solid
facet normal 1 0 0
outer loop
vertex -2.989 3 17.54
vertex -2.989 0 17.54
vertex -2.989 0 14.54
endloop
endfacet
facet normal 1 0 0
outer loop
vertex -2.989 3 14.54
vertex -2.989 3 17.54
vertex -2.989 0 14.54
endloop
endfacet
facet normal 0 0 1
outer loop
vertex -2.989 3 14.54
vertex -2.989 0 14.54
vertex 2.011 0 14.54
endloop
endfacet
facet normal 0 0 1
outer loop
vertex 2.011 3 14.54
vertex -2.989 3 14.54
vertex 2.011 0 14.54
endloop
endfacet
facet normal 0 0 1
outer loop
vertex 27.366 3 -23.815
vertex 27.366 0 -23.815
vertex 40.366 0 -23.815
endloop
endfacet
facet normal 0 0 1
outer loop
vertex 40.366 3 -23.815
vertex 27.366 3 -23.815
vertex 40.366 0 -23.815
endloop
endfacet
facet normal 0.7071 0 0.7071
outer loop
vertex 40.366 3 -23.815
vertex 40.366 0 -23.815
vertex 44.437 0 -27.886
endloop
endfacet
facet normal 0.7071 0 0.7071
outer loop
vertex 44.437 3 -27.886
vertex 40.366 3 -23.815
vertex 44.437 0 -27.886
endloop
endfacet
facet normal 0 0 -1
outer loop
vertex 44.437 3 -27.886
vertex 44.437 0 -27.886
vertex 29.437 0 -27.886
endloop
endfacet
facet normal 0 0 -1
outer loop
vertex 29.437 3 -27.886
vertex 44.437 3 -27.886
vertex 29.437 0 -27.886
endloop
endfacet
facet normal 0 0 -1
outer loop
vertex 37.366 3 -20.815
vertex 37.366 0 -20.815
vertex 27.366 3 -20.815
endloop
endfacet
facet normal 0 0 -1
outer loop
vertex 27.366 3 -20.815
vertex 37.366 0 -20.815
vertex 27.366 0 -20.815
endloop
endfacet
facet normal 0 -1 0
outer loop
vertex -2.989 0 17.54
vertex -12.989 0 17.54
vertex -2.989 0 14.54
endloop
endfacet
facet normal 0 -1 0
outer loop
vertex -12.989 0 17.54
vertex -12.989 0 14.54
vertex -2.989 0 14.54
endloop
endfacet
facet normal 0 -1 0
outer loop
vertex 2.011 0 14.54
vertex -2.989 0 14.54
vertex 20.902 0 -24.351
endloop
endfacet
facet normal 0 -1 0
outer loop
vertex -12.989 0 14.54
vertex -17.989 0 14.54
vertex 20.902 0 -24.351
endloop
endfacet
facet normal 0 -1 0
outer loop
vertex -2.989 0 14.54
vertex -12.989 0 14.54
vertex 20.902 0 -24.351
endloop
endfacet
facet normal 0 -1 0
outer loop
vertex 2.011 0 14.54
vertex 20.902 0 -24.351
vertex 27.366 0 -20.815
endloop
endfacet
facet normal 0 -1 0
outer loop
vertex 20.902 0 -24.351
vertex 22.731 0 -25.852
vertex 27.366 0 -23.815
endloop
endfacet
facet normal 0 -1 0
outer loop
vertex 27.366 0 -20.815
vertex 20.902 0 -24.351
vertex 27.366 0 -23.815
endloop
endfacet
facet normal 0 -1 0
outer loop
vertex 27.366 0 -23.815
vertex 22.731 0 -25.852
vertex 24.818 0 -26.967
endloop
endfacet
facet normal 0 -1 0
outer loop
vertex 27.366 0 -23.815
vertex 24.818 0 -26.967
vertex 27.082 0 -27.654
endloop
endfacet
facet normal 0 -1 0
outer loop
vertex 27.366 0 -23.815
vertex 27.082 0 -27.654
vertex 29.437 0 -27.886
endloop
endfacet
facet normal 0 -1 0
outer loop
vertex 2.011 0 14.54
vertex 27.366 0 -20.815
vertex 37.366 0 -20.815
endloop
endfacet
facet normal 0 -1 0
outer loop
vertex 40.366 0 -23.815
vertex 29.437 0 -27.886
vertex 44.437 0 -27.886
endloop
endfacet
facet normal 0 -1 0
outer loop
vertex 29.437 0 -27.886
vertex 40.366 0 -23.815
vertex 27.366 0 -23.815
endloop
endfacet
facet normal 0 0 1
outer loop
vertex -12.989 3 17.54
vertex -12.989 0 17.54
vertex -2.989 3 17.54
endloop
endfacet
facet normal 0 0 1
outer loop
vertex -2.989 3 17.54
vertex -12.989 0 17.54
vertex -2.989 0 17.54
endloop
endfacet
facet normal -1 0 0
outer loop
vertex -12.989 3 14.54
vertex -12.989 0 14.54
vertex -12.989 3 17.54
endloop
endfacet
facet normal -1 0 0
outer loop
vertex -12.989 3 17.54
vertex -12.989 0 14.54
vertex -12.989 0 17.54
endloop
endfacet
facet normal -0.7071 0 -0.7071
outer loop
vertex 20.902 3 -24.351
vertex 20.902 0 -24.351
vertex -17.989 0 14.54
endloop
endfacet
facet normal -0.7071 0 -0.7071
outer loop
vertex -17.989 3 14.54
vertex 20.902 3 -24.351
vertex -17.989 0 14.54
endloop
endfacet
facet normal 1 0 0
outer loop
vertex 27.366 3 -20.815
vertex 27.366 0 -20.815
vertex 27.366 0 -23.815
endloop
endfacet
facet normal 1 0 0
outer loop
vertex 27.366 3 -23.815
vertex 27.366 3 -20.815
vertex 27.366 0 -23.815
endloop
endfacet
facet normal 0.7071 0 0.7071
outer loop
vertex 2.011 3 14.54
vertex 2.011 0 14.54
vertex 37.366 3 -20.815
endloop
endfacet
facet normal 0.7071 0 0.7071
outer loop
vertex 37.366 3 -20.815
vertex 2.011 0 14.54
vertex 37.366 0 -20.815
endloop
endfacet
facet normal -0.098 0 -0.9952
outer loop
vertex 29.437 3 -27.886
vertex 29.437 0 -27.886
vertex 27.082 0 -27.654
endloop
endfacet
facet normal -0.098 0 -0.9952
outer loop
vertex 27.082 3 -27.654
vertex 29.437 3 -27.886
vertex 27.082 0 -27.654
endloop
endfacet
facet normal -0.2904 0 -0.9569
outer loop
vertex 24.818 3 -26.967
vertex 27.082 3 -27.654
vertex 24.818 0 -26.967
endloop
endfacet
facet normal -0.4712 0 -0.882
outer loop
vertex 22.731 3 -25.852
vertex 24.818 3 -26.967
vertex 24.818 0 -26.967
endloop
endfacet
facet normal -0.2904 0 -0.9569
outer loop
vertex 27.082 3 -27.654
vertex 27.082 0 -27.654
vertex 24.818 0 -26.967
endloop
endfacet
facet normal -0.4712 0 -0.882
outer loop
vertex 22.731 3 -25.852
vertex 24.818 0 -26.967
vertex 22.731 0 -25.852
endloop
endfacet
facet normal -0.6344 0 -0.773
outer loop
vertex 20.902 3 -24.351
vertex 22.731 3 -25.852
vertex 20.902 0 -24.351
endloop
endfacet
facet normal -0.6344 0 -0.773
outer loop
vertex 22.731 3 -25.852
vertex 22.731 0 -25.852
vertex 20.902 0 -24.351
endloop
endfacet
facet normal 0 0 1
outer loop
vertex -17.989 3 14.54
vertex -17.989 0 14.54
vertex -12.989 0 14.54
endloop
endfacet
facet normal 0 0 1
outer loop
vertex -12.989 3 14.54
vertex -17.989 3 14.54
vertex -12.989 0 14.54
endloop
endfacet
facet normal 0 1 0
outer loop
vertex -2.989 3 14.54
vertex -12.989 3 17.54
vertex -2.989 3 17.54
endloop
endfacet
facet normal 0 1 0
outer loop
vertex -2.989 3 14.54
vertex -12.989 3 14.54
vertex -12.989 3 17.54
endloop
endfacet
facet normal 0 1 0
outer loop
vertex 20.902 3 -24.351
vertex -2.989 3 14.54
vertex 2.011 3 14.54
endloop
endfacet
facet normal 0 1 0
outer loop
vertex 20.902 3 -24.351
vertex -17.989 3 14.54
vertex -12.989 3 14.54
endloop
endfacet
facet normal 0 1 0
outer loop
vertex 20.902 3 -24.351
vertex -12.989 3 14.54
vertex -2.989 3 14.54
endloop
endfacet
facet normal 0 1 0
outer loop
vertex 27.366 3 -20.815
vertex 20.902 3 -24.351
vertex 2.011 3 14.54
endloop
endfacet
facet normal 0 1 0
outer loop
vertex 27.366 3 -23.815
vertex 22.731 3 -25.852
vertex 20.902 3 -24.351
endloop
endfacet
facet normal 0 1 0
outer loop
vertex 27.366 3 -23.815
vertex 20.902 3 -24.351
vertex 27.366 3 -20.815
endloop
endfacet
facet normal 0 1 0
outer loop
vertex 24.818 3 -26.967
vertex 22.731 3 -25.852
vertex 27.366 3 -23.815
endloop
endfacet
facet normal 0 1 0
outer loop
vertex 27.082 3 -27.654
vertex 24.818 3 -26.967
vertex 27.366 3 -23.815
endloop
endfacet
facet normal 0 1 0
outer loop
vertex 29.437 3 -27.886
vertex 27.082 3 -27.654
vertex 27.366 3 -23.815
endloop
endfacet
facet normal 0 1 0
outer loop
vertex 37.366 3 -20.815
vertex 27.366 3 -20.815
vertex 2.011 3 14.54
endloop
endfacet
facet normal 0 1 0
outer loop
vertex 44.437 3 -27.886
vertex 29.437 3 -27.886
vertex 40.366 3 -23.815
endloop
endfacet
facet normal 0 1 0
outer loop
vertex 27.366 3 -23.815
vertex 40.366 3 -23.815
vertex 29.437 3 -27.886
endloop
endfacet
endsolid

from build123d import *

# Parameters (mm, degrees)
RESSALTO_EXTRUS_O1_DEPTH = 3


with BuildPart() as part:
    # Esboço1 → Ressalto-extrusão1 (new body)
    with BuildSketch(Plane(origin=(0, 0, 0), x_dir=(1, 0, 0), z_dir=(0, 1, 0))):
        with BuildLine():
            Line((-12.989253032, -17.540319489), (-2.989253032, -17.540319489))
            Line((-2.989253032, -17.540319489), (-2.989253032, -14.540319489))
            Line((-2.989253032, -14.540319489), (2.010746968, -14.540319489))
            Line((2.010746968, -14.540319489), (37.366086027, 20.81501957))
            Line((37.366086027, 20.81501957), (27.366086027, 20.81501957))
            Line((27.366086027, 20.81501957), (27.366086027, 23.81501957))
            Line((27.366086027, 23.81501957), (40.366086027, 23.81501957))
            Line((40.366086027, 23.81501957), (44.437153839, 27.886087382))
            Line((44.437153839, 27.886087382), (29.437153839, 27.886087382))
            ThreePointArc((29.437153839, 27.886087382), (24.817756177, 26.967232057), (20.901619933, 24.350553476))
            Line((20.901619933, 24.350553476), (-17.989253032, -14.540319489))
            Line((-17.989253032, -14.540319489), (-12.989253032, -14.540319489))
            Line((-12.989253032, -14.540319489), (-12.989253032, -17.540319489))
        make_face()
    extrude(amount=RESSALTO_EXTRUS_O1_DEPTH)


solid = part.part
